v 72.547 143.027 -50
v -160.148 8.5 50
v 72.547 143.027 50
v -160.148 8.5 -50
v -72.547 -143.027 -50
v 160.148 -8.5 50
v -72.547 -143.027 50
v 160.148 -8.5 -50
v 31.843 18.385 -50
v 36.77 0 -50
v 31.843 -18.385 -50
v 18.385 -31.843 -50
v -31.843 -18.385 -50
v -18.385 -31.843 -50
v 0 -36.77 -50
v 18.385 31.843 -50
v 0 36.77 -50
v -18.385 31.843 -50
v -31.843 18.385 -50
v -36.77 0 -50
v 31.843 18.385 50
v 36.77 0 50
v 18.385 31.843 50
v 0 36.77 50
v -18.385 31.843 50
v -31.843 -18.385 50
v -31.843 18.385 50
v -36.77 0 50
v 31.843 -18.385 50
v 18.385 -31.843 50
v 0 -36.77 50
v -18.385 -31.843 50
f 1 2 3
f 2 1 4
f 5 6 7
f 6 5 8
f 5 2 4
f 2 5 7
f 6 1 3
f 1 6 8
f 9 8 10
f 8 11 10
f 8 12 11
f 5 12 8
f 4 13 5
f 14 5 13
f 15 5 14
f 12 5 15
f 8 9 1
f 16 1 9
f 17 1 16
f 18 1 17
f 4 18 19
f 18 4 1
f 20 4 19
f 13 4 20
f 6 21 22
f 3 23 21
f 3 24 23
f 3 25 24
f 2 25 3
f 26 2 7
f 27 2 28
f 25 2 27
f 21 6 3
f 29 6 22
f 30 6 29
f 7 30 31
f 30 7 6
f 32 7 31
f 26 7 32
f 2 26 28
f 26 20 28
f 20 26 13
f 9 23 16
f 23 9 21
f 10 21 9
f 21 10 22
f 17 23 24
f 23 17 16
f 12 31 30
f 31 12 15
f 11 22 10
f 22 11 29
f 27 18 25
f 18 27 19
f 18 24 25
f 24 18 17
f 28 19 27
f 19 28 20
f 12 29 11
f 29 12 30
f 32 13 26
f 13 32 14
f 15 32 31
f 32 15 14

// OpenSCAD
difference() {
	translate([0,0,0]){
	rotate([90,0,-59.96672058105469]){
		cube([175.0272216796875,99.99998474121094,268.7835998535156], center = true);
	}
}

	translate([0,0,0]){
	cylinder($fn = 12, h = 99.99998474121094, r1 = 36.769554138183594, r2 = 36.769554138183594, center = true);
}
}
